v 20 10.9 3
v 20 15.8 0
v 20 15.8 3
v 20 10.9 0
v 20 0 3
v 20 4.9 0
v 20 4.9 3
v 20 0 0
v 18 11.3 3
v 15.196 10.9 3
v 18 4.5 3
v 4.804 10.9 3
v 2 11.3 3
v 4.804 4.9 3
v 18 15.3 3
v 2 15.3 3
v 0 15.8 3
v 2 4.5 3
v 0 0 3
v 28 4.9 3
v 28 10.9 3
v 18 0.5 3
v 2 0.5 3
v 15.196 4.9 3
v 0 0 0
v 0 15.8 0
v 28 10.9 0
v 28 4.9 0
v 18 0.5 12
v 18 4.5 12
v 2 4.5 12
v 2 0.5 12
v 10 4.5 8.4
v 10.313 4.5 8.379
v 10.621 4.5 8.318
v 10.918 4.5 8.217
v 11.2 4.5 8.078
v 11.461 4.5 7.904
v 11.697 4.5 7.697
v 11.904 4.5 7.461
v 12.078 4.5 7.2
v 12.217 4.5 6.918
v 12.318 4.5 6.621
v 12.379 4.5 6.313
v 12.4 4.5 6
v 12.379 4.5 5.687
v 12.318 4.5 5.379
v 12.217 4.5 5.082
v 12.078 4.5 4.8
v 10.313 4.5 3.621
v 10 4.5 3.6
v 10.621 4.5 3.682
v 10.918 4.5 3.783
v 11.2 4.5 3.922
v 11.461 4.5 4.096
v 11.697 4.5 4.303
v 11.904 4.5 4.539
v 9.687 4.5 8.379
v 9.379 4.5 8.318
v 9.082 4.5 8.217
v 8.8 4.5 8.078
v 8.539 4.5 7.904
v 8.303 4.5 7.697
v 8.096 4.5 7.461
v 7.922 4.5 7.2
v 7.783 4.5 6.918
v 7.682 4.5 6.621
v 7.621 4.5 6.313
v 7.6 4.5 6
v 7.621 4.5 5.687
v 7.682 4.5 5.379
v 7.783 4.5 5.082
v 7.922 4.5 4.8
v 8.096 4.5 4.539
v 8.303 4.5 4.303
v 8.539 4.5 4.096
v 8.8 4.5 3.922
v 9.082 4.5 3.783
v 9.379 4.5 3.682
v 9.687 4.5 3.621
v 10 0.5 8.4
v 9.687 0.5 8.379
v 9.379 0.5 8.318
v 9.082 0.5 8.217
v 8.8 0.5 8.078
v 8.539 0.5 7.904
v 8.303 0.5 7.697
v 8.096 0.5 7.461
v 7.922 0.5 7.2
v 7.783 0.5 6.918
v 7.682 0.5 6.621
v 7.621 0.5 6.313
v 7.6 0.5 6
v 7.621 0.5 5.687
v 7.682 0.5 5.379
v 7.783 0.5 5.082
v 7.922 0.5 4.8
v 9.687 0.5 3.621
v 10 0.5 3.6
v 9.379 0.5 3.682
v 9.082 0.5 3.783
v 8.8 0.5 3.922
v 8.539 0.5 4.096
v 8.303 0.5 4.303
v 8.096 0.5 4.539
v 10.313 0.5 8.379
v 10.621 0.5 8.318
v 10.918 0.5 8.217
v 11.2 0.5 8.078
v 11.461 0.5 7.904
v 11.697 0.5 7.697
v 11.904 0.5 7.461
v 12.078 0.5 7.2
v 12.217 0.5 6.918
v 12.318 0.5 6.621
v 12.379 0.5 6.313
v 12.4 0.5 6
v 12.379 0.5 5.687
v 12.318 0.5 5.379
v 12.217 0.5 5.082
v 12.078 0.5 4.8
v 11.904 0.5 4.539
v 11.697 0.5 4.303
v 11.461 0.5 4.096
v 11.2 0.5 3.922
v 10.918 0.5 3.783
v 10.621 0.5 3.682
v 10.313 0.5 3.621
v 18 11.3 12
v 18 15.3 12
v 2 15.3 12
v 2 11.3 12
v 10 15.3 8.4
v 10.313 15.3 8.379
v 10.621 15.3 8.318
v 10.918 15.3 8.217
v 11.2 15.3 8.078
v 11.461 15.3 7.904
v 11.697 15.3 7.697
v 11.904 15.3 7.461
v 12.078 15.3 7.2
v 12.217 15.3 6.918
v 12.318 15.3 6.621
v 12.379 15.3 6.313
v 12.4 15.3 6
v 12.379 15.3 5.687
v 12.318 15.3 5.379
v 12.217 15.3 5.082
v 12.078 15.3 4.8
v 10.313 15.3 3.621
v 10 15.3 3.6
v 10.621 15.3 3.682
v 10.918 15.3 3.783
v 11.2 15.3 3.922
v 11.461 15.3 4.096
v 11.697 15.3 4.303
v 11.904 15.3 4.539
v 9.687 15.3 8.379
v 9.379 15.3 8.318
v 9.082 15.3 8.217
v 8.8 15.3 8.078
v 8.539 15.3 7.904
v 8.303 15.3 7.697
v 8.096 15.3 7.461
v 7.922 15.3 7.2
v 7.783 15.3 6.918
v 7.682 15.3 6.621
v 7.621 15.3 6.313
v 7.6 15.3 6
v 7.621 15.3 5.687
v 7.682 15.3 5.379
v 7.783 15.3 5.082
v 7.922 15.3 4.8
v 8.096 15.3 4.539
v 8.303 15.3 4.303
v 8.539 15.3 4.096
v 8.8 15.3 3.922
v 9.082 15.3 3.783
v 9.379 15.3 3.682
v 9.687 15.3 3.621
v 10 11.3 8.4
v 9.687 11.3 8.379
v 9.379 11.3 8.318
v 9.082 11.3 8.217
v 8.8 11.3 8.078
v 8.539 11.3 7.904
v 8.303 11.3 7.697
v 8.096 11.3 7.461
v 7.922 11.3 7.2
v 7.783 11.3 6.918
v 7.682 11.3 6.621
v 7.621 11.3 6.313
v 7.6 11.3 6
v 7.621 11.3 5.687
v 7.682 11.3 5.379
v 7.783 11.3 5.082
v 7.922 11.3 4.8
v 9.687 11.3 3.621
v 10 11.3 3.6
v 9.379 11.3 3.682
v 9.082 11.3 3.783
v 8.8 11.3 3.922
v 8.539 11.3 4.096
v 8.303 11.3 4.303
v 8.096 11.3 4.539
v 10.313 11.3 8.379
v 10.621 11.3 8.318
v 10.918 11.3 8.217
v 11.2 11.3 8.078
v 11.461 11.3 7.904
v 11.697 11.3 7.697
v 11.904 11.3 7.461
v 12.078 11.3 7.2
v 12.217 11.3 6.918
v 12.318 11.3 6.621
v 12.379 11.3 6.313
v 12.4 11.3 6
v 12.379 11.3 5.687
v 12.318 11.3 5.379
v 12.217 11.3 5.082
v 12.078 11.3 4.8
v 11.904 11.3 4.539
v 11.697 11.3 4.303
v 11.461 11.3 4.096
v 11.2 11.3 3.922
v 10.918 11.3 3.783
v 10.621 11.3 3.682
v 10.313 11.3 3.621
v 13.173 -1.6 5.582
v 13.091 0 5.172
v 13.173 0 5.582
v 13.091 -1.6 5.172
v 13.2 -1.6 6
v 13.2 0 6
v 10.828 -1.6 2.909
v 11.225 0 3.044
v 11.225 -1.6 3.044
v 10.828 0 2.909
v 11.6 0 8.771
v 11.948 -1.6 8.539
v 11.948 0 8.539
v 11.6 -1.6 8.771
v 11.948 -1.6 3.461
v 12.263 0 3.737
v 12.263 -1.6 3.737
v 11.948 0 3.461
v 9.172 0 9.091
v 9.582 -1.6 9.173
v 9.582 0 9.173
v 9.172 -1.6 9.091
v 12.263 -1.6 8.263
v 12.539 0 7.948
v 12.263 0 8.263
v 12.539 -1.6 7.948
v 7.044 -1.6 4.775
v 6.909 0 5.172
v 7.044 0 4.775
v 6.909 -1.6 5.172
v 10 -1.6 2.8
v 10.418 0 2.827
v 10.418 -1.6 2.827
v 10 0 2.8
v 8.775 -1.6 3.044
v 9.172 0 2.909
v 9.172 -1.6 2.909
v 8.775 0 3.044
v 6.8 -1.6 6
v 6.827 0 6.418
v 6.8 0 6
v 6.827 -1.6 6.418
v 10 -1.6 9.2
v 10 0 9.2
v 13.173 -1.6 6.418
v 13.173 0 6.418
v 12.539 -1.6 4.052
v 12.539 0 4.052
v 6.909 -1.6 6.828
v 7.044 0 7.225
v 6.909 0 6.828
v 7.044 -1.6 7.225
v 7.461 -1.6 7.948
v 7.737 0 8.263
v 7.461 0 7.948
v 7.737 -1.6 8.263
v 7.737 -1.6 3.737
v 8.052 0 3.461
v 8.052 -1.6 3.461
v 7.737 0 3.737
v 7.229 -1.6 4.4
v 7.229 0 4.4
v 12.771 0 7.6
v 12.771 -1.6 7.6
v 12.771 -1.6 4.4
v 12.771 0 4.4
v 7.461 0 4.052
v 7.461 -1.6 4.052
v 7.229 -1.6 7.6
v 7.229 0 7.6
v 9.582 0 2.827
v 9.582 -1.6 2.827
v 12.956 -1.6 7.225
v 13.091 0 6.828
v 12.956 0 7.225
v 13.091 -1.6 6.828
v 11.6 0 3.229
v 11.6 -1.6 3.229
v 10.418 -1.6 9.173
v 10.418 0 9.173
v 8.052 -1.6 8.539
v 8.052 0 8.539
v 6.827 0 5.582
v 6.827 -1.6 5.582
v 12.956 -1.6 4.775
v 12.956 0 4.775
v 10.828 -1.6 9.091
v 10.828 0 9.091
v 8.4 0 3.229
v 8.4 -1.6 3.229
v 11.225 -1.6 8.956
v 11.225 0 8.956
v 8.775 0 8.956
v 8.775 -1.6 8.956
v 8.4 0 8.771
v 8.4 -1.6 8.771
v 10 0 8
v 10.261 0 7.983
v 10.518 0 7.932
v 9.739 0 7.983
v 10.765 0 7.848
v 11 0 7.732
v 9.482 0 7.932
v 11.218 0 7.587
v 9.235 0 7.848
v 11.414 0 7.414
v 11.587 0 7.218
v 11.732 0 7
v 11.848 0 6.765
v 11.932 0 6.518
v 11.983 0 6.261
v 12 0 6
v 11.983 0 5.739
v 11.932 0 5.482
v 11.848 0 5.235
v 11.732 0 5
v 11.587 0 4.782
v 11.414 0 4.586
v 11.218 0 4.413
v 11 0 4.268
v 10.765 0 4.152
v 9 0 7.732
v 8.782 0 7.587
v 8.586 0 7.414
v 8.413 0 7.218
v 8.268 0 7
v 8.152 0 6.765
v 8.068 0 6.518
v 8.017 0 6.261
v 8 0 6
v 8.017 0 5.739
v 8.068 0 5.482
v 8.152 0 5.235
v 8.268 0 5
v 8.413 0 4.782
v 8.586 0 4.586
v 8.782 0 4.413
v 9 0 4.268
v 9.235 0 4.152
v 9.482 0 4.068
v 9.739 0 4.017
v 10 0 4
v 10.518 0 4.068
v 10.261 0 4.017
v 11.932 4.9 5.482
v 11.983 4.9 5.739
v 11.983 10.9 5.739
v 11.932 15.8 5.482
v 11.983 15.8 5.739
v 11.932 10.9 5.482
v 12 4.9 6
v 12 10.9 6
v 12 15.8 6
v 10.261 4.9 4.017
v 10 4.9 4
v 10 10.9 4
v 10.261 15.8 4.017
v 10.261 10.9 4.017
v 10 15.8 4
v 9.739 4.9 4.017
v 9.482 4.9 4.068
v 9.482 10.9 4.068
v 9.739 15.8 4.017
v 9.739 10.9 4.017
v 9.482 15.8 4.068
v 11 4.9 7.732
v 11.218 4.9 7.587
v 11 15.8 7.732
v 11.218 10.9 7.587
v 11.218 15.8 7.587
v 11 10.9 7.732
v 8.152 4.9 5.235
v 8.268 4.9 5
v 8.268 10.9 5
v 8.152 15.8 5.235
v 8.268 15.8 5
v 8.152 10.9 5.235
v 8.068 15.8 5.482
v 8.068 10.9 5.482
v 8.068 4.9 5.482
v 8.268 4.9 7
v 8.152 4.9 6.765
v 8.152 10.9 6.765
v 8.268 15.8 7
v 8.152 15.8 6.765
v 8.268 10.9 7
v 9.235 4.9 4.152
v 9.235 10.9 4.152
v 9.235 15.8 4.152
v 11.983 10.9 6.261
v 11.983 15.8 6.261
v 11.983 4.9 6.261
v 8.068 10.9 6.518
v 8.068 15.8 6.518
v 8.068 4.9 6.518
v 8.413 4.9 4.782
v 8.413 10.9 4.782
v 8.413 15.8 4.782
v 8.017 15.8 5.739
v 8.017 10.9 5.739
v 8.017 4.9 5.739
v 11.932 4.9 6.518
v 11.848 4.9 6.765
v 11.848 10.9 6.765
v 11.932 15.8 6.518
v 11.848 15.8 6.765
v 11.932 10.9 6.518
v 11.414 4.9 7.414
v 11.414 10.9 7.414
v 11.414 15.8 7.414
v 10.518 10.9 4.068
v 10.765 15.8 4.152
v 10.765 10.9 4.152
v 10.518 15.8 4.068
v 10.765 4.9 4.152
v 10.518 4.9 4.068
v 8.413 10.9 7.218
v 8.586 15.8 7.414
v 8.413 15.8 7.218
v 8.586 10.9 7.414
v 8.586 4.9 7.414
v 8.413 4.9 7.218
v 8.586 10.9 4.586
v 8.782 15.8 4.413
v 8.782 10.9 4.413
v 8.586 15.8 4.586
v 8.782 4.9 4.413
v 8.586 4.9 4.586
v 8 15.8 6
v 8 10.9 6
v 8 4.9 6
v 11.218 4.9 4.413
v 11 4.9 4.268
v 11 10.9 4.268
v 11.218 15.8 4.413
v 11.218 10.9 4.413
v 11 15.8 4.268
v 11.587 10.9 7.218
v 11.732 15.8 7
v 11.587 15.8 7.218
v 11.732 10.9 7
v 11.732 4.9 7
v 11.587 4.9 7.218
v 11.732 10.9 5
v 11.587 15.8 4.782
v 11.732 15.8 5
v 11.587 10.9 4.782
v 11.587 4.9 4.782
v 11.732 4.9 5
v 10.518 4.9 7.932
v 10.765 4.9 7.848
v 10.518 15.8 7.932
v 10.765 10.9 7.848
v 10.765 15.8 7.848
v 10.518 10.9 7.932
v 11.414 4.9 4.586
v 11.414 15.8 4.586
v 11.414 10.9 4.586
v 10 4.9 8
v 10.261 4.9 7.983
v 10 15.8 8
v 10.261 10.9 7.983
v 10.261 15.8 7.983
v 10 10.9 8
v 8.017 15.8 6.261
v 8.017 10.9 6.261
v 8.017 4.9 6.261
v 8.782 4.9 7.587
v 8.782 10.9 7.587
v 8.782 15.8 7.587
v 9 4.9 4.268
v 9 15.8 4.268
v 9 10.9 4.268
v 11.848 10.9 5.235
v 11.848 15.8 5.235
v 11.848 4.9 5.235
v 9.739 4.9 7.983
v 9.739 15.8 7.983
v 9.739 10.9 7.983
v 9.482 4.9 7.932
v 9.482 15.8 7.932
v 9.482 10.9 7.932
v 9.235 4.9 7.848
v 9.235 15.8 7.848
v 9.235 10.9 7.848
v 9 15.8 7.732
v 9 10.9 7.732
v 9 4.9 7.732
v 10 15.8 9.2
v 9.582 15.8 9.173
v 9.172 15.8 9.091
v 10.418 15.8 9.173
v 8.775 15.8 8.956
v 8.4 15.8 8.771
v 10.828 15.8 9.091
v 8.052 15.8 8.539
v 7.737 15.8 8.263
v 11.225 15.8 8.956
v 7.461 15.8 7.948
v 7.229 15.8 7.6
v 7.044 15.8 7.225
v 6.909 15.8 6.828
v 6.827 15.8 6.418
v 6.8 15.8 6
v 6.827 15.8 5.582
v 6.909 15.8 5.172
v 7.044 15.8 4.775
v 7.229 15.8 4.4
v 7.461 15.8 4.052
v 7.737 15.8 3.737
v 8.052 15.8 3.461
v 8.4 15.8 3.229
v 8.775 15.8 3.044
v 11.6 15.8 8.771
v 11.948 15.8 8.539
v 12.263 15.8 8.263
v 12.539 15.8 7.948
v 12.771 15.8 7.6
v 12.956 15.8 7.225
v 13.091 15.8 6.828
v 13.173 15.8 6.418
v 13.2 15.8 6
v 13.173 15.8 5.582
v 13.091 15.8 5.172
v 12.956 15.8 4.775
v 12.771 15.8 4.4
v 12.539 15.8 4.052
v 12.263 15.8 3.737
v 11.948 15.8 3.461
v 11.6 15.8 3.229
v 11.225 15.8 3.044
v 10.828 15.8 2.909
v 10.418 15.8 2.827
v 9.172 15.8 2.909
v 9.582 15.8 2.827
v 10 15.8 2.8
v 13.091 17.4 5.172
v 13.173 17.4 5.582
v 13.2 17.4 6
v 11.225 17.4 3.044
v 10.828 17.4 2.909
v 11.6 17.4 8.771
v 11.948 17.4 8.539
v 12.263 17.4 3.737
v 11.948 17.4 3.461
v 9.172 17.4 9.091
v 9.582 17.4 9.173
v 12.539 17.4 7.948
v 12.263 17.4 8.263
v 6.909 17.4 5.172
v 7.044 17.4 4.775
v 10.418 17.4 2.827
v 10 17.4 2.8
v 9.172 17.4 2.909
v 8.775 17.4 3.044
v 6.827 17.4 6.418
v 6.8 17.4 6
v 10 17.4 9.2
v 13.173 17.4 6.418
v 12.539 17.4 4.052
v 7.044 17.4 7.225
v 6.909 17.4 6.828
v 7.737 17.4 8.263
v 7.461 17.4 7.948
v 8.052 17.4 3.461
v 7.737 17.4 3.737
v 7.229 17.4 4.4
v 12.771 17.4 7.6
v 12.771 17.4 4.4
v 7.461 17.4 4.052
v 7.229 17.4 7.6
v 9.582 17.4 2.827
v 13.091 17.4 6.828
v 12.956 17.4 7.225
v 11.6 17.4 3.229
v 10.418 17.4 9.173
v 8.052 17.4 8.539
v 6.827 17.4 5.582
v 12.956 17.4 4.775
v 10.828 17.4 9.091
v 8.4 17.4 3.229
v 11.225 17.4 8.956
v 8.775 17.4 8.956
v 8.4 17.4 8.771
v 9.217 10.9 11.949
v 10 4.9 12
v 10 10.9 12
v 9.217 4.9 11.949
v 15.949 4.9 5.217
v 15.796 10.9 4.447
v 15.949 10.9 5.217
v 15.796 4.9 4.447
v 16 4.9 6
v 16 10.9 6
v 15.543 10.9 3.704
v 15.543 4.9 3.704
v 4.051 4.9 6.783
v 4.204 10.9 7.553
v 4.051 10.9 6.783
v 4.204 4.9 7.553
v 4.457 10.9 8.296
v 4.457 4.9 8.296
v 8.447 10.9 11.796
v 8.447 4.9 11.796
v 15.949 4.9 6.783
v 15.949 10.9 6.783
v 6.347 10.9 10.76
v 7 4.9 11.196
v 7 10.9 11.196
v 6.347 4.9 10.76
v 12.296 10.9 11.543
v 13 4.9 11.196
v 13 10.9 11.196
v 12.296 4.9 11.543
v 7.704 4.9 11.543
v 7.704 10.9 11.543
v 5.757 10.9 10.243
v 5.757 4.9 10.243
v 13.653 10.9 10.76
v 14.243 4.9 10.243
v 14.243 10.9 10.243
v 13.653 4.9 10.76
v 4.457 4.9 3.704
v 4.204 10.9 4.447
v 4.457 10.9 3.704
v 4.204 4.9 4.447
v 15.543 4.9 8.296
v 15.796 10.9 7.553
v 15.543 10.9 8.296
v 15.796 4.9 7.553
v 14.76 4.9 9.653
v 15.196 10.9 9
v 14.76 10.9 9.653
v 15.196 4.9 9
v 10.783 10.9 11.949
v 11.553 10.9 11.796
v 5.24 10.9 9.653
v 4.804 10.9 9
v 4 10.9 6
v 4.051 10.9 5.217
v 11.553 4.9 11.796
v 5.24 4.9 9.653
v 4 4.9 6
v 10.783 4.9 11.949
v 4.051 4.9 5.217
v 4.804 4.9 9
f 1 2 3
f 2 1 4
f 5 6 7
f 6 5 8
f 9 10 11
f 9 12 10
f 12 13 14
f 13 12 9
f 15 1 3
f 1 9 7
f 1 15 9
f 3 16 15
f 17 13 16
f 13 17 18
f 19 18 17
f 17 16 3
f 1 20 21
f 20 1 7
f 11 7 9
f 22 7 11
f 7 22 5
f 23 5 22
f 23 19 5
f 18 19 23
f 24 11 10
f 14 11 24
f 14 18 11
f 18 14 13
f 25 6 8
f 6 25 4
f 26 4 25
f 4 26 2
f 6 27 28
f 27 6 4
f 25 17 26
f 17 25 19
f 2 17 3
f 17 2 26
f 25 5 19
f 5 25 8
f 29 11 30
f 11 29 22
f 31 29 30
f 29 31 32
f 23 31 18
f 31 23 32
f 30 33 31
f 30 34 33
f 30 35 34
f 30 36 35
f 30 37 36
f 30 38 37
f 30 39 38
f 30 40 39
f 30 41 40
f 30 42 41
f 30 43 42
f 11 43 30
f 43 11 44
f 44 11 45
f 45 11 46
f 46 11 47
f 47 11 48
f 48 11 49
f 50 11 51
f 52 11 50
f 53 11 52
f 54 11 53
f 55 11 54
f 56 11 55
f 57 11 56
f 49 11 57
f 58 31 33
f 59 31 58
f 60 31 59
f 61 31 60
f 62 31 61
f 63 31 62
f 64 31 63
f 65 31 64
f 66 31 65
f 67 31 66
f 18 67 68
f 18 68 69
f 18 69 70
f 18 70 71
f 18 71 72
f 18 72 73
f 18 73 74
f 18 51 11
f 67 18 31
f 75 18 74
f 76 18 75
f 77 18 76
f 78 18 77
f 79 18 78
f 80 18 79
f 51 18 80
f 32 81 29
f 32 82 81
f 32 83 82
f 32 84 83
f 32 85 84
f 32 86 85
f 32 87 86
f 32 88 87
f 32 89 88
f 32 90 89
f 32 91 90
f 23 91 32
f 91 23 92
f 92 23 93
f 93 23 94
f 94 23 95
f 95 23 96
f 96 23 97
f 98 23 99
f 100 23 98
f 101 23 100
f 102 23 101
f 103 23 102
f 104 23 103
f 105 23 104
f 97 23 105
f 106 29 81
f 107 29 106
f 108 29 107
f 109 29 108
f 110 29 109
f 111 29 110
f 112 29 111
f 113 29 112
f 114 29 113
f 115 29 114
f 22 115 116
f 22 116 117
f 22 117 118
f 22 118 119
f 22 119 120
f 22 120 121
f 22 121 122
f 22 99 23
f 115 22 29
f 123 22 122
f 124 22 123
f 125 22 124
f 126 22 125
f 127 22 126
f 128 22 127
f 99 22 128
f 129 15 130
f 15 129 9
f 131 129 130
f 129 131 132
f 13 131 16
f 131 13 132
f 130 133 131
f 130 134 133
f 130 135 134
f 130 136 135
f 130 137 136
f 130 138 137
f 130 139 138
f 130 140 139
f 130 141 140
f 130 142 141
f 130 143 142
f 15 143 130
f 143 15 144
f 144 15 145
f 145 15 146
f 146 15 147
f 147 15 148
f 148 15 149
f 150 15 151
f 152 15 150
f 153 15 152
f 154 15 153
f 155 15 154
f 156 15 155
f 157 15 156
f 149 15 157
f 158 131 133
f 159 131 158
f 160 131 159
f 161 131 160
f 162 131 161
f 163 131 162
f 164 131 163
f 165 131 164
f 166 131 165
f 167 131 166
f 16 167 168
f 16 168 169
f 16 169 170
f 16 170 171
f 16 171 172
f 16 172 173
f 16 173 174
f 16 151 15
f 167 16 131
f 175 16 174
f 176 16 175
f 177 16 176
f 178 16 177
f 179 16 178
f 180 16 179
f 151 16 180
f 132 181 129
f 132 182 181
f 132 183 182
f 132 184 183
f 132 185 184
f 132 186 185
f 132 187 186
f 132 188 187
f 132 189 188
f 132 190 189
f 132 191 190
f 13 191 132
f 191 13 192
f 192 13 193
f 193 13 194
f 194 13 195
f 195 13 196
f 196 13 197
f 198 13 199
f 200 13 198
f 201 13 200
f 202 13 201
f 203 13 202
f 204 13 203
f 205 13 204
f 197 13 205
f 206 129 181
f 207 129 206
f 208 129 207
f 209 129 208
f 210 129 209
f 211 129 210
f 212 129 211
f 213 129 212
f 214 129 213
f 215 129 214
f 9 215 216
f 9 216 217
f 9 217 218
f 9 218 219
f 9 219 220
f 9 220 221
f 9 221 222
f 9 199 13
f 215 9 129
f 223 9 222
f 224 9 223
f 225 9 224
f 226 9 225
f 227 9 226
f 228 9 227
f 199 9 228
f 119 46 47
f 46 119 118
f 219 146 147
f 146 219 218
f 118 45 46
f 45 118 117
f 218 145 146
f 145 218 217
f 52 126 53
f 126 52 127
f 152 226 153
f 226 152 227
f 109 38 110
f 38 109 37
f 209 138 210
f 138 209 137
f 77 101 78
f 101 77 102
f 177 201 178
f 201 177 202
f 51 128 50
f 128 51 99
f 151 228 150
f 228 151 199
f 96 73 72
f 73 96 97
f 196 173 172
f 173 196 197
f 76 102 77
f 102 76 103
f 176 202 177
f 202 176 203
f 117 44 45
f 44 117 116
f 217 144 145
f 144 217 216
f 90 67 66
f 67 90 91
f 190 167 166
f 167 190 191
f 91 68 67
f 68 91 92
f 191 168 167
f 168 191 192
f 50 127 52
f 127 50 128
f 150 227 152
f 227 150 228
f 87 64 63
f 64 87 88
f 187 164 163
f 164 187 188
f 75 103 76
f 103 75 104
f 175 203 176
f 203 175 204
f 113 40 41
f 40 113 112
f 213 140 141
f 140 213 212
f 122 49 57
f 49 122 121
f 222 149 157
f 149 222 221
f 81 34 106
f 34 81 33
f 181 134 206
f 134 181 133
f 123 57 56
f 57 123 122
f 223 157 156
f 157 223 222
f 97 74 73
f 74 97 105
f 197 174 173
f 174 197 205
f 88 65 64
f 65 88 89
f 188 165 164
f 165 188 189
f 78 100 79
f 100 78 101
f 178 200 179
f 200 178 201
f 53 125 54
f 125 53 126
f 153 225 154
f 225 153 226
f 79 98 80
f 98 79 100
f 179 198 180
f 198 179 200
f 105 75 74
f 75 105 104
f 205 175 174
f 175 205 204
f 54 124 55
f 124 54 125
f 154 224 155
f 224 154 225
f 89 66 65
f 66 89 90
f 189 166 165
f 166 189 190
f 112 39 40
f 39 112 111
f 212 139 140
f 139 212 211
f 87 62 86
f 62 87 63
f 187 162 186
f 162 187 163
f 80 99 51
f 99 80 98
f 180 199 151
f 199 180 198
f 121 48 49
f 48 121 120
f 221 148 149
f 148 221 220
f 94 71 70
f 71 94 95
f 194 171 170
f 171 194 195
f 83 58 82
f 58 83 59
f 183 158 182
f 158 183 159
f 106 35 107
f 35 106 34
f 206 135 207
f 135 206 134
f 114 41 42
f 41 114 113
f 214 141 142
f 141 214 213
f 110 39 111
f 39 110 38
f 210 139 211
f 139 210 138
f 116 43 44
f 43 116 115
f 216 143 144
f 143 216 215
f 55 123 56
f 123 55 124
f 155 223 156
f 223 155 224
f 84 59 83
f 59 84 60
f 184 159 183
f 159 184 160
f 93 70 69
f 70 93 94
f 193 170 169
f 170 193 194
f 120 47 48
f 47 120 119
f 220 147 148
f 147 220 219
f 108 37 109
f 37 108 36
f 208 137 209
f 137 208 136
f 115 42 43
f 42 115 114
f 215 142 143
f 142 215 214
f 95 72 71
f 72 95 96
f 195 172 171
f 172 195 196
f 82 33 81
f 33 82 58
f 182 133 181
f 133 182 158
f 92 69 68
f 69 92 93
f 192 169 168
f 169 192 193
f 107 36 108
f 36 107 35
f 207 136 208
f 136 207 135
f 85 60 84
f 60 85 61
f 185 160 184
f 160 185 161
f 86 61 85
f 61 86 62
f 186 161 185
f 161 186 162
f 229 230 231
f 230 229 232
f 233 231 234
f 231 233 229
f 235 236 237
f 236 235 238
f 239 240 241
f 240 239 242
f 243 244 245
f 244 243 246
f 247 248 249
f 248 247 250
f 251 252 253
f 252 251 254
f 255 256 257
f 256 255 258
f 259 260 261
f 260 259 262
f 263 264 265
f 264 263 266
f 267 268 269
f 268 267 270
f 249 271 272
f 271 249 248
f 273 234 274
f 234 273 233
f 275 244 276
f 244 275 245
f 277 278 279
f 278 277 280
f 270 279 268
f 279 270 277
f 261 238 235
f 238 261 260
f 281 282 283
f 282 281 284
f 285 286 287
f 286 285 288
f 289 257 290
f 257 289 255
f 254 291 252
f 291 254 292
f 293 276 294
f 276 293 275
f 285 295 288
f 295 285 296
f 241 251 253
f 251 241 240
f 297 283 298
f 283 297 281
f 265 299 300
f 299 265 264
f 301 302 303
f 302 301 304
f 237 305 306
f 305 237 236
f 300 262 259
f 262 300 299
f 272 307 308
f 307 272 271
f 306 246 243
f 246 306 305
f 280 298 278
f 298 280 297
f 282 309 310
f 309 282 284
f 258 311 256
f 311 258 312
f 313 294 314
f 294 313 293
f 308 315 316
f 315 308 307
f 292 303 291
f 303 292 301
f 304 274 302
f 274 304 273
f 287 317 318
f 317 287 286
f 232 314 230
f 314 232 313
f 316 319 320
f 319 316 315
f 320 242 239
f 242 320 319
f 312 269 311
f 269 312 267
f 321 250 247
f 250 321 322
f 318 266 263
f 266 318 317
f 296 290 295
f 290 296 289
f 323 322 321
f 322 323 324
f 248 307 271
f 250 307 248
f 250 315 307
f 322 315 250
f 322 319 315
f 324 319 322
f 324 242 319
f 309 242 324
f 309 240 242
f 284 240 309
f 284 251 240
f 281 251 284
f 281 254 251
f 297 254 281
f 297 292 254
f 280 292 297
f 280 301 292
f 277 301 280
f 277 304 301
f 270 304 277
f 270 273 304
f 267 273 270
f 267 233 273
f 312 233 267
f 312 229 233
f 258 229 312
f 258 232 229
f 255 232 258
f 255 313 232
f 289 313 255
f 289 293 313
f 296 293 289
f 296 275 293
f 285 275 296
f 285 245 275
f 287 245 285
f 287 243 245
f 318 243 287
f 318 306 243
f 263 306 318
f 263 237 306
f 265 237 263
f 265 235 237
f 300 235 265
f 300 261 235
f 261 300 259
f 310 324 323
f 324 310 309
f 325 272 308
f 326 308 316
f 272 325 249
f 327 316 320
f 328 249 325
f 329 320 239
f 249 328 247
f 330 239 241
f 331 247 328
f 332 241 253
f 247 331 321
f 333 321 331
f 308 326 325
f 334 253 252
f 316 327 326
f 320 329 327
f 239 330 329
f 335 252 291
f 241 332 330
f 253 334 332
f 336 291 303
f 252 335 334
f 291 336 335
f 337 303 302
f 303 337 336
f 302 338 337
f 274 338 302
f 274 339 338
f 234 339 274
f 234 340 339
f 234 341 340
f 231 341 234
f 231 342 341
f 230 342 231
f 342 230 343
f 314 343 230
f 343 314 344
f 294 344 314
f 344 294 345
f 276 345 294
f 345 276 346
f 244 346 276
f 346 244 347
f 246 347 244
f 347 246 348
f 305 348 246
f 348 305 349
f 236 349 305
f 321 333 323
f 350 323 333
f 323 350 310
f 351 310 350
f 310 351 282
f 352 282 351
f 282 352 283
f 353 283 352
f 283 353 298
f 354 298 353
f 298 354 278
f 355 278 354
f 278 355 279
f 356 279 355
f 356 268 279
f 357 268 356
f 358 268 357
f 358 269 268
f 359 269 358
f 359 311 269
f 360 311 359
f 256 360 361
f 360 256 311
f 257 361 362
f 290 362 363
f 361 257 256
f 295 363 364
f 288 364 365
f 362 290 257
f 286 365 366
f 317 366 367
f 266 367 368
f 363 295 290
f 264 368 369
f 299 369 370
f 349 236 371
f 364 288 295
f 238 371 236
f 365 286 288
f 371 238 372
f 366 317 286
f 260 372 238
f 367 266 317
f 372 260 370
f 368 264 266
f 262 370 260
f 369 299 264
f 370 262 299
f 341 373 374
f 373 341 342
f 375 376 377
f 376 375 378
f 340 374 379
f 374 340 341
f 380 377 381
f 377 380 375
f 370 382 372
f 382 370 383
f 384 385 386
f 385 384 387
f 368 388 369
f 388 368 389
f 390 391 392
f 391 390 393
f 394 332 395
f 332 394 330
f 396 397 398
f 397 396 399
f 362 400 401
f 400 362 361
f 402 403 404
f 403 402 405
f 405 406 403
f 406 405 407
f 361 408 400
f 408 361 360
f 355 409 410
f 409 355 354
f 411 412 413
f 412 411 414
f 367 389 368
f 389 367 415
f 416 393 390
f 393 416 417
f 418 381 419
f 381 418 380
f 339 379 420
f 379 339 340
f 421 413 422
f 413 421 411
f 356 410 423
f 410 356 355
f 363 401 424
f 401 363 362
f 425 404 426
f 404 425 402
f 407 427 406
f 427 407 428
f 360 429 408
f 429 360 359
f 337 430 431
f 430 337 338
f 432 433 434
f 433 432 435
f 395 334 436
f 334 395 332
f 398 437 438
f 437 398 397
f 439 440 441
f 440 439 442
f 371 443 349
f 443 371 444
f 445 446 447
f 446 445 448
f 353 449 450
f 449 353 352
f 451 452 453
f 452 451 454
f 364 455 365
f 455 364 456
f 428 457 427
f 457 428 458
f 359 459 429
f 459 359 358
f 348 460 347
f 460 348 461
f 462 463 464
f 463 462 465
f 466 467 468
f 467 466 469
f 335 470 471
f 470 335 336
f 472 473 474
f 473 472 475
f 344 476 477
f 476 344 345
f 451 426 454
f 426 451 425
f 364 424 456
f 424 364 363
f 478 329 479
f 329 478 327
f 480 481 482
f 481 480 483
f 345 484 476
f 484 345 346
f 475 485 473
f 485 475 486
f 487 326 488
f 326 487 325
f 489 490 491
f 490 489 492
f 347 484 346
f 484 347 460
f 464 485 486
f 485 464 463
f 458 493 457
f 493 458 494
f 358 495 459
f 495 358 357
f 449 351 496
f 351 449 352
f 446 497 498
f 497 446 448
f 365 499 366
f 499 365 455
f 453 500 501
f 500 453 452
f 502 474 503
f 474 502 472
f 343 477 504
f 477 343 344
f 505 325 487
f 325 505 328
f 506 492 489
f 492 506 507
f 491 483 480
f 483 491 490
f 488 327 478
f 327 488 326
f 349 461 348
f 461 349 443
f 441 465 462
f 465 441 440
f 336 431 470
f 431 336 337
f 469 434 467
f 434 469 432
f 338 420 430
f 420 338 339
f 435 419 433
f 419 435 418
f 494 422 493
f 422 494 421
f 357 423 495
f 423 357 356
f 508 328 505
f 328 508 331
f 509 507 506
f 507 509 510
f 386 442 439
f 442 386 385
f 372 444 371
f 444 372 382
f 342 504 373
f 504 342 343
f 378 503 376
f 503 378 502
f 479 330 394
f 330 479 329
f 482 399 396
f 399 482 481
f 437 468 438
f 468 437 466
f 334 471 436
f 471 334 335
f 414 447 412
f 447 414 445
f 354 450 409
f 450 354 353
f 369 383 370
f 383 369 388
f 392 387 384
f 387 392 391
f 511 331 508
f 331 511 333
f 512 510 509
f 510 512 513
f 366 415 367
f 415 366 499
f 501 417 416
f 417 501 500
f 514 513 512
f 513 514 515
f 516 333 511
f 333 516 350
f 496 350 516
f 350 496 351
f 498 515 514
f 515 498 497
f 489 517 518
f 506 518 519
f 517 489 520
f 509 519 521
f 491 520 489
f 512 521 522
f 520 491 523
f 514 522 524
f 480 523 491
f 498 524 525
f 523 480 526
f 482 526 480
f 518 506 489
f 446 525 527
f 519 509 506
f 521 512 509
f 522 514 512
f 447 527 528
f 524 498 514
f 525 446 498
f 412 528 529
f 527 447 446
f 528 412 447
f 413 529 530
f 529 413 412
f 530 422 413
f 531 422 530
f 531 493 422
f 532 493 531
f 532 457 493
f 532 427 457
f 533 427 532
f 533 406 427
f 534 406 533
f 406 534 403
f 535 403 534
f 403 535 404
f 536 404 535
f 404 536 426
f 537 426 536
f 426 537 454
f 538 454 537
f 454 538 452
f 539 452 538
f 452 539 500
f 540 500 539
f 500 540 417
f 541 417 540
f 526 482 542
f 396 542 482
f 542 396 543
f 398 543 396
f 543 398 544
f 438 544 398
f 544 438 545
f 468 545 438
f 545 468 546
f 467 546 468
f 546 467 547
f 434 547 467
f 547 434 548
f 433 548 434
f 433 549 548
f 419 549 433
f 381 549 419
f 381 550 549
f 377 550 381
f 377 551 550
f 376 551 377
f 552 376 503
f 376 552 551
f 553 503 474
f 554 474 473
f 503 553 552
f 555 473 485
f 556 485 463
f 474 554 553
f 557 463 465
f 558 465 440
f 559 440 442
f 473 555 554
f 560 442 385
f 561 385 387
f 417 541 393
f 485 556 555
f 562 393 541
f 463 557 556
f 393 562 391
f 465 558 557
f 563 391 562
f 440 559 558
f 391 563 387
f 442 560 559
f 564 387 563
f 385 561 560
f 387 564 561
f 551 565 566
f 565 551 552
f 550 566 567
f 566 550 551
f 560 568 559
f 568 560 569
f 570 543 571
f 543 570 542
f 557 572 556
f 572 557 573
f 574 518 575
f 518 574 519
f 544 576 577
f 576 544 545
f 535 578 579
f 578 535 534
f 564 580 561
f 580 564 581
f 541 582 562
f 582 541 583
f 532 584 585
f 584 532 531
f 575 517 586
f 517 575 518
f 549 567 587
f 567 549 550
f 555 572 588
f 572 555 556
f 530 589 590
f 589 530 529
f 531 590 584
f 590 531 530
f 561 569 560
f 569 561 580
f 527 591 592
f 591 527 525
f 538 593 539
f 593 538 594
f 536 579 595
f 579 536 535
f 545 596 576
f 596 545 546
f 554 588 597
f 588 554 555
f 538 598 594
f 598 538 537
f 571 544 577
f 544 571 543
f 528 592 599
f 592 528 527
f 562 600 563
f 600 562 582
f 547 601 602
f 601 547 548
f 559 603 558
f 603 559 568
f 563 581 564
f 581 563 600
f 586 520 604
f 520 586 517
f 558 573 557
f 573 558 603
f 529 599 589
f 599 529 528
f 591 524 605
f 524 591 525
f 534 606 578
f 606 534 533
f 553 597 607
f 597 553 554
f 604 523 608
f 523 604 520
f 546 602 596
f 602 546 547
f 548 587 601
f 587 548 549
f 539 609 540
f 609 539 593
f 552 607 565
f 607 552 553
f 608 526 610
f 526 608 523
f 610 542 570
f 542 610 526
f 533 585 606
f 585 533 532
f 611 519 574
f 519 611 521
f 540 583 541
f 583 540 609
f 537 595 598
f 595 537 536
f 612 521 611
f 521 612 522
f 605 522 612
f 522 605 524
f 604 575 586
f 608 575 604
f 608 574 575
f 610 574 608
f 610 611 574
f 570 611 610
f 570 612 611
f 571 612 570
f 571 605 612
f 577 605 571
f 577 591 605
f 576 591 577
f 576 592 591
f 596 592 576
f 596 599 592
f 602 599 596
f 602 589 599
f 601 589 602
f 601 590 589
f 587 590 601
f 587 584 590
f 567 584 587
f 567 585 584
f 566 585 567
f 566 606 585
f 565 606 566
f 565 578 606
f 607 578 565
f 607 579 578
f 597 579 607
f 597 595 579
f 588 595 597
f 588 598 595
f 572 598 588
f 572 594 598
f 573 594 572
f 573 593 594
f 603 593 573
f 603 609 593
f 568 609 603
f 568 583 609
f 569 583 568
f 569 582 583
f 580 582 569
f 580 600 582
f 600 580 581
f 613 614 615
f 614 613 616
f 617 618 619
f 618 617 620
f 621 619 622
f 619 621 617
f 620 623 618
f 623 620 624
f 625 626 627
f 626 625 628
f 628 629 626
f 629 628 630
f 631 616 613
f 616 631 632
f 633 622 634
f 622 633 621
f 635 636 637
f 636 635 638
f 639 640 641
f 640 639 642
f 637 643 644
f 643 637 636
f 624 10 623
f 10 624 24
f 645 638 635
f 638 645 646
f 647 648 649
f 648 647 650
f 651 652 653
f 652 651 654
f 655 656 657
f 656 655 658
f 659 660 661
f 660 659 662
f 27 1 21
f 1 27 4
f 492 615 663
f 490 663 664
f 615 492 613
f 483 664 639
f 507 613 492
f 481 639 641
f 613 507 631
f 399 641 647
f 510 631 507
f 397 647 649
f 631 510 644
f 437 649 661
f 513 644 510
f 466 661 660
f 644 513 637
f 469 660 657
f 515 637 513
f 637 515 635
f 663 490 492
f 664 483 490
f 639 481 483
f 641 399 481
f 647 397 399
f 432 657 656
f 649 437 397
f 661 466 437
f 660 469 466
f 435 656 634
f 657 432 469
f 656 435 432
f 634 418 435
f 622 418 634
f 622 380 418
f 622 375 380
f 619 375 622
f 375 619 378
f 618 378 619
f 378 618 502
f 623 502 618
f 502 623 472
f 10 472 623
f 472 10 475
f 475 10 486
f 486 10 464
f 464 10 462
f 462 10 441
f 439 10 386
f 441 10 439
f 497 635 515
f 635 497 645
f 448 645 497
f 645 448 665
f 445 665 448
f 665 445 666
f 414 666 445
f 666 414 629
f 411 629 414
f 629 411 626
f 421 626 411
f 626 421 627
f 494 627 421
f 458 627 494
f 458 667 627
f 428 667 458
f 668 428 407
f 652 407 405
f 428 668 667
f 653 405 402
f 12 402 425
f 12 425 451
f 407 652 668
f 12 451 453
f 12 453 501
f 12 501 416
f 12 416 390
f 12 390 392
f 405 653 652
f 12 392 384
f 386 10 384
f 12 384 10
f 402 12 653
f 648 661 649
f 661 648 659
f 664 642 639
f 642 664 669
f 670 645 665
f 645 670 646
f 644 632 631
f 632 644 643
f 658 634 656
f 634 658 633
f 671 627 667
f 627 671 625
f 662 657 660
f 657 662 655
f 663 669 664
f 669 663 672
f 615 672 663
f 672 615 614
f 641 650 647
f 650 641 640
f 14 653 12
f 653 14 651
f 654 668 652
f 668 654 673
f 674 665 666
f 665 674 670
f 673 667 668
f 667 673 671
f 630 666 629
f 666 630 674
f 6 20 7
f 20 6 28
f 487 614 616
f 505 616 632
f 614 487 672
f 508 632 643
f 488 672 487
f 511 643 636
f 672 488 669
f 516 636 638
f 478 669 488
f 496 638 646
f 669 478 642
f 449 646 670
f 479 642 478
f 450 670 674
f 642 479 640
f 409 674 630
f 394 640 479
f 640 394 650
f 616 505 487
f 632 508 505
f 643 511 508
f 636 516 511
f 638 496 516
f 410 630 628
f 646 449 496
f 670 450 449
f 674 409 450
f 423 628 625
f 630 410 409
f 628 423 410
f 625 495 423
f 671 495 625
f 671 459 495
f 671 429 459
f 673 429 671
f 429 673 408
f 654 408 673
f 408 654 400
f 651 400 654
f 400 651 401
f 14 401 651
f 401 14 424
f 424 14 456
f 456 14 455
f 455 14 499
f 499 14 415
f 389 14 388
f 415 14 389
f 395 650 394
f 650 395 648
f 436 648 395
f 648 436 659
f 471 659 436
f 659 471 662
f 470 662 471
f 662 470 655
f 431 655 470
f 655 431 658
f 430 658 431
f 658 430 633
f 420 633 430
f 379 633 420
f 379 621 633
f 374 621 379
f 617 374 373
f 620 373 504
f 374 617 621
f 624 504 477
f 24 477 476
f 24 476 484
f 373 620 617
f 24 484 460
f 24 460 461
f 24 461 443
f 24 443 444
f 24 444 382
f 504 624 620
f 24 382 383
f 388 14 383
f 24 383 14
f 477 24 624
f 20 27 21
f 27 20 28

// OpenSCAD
// Fixture: print-in-place pin joint (mm)
// Target: Bambu Lab P2S, 0.4 mm nozzle
// pin / print-in-place
// radial_mm = 0.4  (bore_d = pin_d + 0.8)
// axial_mm = 0.5   min_pin_mm = 4
$fn = 48;
radial_mm = 0.4;
axial_mm = 0.5;
pin_d = 4;
bore_d = 4.8;
cheek_t = 4;
rotor_t = 6;
rotor_od = 12;
axis_x = 10;
axis_z = 6;
cheek_w = 16;
base_t = 3;
lever_l = 18;

module cheek(y0) {
  translate([2, y0, 0])
    cube([cheek_w, cheek_t, rotor_od]);
}

module stator() {
  difference() {
    union() {
      cube([20, 15.8, base_t]);
      cheek(0.5);
      cheek(11.3);
    }
    translate([axis_x, -1, axis_z])
      rotate([-90, 0, 0])
        cylinder(h = 15.8 + 2, d = bore_d);
  }
}

module rotor_and_pin() {
  head_d = pin_d + 2.4;
  head_h = 1.6;
  union() {
    translate([axis_x, -head_h, axis_z])
      rotate([-90, 0, 0]) {
        cylinder(h = head_h, d = head_d);
        translate([0, 0, head_h])
          cylinder(h = 15.8, d = pin_d);
        translate([0, 0, head_h + 15.8])
          cylinder(h = head_h, d = head_d);
      }
    translate([axis_x, 4.9, axis_z])
      rotate([-90, 0, 0])
        cylinder(h = rotor_t, d = rotor_od);
    translate([axis_x, 4.9, 0])
      cube([lever_l, rotor_t, base_t]);
  }
}

// Separate solids — pin is fused to the rotor only, not the cheeks.
stator();
rotor_and_pin();
